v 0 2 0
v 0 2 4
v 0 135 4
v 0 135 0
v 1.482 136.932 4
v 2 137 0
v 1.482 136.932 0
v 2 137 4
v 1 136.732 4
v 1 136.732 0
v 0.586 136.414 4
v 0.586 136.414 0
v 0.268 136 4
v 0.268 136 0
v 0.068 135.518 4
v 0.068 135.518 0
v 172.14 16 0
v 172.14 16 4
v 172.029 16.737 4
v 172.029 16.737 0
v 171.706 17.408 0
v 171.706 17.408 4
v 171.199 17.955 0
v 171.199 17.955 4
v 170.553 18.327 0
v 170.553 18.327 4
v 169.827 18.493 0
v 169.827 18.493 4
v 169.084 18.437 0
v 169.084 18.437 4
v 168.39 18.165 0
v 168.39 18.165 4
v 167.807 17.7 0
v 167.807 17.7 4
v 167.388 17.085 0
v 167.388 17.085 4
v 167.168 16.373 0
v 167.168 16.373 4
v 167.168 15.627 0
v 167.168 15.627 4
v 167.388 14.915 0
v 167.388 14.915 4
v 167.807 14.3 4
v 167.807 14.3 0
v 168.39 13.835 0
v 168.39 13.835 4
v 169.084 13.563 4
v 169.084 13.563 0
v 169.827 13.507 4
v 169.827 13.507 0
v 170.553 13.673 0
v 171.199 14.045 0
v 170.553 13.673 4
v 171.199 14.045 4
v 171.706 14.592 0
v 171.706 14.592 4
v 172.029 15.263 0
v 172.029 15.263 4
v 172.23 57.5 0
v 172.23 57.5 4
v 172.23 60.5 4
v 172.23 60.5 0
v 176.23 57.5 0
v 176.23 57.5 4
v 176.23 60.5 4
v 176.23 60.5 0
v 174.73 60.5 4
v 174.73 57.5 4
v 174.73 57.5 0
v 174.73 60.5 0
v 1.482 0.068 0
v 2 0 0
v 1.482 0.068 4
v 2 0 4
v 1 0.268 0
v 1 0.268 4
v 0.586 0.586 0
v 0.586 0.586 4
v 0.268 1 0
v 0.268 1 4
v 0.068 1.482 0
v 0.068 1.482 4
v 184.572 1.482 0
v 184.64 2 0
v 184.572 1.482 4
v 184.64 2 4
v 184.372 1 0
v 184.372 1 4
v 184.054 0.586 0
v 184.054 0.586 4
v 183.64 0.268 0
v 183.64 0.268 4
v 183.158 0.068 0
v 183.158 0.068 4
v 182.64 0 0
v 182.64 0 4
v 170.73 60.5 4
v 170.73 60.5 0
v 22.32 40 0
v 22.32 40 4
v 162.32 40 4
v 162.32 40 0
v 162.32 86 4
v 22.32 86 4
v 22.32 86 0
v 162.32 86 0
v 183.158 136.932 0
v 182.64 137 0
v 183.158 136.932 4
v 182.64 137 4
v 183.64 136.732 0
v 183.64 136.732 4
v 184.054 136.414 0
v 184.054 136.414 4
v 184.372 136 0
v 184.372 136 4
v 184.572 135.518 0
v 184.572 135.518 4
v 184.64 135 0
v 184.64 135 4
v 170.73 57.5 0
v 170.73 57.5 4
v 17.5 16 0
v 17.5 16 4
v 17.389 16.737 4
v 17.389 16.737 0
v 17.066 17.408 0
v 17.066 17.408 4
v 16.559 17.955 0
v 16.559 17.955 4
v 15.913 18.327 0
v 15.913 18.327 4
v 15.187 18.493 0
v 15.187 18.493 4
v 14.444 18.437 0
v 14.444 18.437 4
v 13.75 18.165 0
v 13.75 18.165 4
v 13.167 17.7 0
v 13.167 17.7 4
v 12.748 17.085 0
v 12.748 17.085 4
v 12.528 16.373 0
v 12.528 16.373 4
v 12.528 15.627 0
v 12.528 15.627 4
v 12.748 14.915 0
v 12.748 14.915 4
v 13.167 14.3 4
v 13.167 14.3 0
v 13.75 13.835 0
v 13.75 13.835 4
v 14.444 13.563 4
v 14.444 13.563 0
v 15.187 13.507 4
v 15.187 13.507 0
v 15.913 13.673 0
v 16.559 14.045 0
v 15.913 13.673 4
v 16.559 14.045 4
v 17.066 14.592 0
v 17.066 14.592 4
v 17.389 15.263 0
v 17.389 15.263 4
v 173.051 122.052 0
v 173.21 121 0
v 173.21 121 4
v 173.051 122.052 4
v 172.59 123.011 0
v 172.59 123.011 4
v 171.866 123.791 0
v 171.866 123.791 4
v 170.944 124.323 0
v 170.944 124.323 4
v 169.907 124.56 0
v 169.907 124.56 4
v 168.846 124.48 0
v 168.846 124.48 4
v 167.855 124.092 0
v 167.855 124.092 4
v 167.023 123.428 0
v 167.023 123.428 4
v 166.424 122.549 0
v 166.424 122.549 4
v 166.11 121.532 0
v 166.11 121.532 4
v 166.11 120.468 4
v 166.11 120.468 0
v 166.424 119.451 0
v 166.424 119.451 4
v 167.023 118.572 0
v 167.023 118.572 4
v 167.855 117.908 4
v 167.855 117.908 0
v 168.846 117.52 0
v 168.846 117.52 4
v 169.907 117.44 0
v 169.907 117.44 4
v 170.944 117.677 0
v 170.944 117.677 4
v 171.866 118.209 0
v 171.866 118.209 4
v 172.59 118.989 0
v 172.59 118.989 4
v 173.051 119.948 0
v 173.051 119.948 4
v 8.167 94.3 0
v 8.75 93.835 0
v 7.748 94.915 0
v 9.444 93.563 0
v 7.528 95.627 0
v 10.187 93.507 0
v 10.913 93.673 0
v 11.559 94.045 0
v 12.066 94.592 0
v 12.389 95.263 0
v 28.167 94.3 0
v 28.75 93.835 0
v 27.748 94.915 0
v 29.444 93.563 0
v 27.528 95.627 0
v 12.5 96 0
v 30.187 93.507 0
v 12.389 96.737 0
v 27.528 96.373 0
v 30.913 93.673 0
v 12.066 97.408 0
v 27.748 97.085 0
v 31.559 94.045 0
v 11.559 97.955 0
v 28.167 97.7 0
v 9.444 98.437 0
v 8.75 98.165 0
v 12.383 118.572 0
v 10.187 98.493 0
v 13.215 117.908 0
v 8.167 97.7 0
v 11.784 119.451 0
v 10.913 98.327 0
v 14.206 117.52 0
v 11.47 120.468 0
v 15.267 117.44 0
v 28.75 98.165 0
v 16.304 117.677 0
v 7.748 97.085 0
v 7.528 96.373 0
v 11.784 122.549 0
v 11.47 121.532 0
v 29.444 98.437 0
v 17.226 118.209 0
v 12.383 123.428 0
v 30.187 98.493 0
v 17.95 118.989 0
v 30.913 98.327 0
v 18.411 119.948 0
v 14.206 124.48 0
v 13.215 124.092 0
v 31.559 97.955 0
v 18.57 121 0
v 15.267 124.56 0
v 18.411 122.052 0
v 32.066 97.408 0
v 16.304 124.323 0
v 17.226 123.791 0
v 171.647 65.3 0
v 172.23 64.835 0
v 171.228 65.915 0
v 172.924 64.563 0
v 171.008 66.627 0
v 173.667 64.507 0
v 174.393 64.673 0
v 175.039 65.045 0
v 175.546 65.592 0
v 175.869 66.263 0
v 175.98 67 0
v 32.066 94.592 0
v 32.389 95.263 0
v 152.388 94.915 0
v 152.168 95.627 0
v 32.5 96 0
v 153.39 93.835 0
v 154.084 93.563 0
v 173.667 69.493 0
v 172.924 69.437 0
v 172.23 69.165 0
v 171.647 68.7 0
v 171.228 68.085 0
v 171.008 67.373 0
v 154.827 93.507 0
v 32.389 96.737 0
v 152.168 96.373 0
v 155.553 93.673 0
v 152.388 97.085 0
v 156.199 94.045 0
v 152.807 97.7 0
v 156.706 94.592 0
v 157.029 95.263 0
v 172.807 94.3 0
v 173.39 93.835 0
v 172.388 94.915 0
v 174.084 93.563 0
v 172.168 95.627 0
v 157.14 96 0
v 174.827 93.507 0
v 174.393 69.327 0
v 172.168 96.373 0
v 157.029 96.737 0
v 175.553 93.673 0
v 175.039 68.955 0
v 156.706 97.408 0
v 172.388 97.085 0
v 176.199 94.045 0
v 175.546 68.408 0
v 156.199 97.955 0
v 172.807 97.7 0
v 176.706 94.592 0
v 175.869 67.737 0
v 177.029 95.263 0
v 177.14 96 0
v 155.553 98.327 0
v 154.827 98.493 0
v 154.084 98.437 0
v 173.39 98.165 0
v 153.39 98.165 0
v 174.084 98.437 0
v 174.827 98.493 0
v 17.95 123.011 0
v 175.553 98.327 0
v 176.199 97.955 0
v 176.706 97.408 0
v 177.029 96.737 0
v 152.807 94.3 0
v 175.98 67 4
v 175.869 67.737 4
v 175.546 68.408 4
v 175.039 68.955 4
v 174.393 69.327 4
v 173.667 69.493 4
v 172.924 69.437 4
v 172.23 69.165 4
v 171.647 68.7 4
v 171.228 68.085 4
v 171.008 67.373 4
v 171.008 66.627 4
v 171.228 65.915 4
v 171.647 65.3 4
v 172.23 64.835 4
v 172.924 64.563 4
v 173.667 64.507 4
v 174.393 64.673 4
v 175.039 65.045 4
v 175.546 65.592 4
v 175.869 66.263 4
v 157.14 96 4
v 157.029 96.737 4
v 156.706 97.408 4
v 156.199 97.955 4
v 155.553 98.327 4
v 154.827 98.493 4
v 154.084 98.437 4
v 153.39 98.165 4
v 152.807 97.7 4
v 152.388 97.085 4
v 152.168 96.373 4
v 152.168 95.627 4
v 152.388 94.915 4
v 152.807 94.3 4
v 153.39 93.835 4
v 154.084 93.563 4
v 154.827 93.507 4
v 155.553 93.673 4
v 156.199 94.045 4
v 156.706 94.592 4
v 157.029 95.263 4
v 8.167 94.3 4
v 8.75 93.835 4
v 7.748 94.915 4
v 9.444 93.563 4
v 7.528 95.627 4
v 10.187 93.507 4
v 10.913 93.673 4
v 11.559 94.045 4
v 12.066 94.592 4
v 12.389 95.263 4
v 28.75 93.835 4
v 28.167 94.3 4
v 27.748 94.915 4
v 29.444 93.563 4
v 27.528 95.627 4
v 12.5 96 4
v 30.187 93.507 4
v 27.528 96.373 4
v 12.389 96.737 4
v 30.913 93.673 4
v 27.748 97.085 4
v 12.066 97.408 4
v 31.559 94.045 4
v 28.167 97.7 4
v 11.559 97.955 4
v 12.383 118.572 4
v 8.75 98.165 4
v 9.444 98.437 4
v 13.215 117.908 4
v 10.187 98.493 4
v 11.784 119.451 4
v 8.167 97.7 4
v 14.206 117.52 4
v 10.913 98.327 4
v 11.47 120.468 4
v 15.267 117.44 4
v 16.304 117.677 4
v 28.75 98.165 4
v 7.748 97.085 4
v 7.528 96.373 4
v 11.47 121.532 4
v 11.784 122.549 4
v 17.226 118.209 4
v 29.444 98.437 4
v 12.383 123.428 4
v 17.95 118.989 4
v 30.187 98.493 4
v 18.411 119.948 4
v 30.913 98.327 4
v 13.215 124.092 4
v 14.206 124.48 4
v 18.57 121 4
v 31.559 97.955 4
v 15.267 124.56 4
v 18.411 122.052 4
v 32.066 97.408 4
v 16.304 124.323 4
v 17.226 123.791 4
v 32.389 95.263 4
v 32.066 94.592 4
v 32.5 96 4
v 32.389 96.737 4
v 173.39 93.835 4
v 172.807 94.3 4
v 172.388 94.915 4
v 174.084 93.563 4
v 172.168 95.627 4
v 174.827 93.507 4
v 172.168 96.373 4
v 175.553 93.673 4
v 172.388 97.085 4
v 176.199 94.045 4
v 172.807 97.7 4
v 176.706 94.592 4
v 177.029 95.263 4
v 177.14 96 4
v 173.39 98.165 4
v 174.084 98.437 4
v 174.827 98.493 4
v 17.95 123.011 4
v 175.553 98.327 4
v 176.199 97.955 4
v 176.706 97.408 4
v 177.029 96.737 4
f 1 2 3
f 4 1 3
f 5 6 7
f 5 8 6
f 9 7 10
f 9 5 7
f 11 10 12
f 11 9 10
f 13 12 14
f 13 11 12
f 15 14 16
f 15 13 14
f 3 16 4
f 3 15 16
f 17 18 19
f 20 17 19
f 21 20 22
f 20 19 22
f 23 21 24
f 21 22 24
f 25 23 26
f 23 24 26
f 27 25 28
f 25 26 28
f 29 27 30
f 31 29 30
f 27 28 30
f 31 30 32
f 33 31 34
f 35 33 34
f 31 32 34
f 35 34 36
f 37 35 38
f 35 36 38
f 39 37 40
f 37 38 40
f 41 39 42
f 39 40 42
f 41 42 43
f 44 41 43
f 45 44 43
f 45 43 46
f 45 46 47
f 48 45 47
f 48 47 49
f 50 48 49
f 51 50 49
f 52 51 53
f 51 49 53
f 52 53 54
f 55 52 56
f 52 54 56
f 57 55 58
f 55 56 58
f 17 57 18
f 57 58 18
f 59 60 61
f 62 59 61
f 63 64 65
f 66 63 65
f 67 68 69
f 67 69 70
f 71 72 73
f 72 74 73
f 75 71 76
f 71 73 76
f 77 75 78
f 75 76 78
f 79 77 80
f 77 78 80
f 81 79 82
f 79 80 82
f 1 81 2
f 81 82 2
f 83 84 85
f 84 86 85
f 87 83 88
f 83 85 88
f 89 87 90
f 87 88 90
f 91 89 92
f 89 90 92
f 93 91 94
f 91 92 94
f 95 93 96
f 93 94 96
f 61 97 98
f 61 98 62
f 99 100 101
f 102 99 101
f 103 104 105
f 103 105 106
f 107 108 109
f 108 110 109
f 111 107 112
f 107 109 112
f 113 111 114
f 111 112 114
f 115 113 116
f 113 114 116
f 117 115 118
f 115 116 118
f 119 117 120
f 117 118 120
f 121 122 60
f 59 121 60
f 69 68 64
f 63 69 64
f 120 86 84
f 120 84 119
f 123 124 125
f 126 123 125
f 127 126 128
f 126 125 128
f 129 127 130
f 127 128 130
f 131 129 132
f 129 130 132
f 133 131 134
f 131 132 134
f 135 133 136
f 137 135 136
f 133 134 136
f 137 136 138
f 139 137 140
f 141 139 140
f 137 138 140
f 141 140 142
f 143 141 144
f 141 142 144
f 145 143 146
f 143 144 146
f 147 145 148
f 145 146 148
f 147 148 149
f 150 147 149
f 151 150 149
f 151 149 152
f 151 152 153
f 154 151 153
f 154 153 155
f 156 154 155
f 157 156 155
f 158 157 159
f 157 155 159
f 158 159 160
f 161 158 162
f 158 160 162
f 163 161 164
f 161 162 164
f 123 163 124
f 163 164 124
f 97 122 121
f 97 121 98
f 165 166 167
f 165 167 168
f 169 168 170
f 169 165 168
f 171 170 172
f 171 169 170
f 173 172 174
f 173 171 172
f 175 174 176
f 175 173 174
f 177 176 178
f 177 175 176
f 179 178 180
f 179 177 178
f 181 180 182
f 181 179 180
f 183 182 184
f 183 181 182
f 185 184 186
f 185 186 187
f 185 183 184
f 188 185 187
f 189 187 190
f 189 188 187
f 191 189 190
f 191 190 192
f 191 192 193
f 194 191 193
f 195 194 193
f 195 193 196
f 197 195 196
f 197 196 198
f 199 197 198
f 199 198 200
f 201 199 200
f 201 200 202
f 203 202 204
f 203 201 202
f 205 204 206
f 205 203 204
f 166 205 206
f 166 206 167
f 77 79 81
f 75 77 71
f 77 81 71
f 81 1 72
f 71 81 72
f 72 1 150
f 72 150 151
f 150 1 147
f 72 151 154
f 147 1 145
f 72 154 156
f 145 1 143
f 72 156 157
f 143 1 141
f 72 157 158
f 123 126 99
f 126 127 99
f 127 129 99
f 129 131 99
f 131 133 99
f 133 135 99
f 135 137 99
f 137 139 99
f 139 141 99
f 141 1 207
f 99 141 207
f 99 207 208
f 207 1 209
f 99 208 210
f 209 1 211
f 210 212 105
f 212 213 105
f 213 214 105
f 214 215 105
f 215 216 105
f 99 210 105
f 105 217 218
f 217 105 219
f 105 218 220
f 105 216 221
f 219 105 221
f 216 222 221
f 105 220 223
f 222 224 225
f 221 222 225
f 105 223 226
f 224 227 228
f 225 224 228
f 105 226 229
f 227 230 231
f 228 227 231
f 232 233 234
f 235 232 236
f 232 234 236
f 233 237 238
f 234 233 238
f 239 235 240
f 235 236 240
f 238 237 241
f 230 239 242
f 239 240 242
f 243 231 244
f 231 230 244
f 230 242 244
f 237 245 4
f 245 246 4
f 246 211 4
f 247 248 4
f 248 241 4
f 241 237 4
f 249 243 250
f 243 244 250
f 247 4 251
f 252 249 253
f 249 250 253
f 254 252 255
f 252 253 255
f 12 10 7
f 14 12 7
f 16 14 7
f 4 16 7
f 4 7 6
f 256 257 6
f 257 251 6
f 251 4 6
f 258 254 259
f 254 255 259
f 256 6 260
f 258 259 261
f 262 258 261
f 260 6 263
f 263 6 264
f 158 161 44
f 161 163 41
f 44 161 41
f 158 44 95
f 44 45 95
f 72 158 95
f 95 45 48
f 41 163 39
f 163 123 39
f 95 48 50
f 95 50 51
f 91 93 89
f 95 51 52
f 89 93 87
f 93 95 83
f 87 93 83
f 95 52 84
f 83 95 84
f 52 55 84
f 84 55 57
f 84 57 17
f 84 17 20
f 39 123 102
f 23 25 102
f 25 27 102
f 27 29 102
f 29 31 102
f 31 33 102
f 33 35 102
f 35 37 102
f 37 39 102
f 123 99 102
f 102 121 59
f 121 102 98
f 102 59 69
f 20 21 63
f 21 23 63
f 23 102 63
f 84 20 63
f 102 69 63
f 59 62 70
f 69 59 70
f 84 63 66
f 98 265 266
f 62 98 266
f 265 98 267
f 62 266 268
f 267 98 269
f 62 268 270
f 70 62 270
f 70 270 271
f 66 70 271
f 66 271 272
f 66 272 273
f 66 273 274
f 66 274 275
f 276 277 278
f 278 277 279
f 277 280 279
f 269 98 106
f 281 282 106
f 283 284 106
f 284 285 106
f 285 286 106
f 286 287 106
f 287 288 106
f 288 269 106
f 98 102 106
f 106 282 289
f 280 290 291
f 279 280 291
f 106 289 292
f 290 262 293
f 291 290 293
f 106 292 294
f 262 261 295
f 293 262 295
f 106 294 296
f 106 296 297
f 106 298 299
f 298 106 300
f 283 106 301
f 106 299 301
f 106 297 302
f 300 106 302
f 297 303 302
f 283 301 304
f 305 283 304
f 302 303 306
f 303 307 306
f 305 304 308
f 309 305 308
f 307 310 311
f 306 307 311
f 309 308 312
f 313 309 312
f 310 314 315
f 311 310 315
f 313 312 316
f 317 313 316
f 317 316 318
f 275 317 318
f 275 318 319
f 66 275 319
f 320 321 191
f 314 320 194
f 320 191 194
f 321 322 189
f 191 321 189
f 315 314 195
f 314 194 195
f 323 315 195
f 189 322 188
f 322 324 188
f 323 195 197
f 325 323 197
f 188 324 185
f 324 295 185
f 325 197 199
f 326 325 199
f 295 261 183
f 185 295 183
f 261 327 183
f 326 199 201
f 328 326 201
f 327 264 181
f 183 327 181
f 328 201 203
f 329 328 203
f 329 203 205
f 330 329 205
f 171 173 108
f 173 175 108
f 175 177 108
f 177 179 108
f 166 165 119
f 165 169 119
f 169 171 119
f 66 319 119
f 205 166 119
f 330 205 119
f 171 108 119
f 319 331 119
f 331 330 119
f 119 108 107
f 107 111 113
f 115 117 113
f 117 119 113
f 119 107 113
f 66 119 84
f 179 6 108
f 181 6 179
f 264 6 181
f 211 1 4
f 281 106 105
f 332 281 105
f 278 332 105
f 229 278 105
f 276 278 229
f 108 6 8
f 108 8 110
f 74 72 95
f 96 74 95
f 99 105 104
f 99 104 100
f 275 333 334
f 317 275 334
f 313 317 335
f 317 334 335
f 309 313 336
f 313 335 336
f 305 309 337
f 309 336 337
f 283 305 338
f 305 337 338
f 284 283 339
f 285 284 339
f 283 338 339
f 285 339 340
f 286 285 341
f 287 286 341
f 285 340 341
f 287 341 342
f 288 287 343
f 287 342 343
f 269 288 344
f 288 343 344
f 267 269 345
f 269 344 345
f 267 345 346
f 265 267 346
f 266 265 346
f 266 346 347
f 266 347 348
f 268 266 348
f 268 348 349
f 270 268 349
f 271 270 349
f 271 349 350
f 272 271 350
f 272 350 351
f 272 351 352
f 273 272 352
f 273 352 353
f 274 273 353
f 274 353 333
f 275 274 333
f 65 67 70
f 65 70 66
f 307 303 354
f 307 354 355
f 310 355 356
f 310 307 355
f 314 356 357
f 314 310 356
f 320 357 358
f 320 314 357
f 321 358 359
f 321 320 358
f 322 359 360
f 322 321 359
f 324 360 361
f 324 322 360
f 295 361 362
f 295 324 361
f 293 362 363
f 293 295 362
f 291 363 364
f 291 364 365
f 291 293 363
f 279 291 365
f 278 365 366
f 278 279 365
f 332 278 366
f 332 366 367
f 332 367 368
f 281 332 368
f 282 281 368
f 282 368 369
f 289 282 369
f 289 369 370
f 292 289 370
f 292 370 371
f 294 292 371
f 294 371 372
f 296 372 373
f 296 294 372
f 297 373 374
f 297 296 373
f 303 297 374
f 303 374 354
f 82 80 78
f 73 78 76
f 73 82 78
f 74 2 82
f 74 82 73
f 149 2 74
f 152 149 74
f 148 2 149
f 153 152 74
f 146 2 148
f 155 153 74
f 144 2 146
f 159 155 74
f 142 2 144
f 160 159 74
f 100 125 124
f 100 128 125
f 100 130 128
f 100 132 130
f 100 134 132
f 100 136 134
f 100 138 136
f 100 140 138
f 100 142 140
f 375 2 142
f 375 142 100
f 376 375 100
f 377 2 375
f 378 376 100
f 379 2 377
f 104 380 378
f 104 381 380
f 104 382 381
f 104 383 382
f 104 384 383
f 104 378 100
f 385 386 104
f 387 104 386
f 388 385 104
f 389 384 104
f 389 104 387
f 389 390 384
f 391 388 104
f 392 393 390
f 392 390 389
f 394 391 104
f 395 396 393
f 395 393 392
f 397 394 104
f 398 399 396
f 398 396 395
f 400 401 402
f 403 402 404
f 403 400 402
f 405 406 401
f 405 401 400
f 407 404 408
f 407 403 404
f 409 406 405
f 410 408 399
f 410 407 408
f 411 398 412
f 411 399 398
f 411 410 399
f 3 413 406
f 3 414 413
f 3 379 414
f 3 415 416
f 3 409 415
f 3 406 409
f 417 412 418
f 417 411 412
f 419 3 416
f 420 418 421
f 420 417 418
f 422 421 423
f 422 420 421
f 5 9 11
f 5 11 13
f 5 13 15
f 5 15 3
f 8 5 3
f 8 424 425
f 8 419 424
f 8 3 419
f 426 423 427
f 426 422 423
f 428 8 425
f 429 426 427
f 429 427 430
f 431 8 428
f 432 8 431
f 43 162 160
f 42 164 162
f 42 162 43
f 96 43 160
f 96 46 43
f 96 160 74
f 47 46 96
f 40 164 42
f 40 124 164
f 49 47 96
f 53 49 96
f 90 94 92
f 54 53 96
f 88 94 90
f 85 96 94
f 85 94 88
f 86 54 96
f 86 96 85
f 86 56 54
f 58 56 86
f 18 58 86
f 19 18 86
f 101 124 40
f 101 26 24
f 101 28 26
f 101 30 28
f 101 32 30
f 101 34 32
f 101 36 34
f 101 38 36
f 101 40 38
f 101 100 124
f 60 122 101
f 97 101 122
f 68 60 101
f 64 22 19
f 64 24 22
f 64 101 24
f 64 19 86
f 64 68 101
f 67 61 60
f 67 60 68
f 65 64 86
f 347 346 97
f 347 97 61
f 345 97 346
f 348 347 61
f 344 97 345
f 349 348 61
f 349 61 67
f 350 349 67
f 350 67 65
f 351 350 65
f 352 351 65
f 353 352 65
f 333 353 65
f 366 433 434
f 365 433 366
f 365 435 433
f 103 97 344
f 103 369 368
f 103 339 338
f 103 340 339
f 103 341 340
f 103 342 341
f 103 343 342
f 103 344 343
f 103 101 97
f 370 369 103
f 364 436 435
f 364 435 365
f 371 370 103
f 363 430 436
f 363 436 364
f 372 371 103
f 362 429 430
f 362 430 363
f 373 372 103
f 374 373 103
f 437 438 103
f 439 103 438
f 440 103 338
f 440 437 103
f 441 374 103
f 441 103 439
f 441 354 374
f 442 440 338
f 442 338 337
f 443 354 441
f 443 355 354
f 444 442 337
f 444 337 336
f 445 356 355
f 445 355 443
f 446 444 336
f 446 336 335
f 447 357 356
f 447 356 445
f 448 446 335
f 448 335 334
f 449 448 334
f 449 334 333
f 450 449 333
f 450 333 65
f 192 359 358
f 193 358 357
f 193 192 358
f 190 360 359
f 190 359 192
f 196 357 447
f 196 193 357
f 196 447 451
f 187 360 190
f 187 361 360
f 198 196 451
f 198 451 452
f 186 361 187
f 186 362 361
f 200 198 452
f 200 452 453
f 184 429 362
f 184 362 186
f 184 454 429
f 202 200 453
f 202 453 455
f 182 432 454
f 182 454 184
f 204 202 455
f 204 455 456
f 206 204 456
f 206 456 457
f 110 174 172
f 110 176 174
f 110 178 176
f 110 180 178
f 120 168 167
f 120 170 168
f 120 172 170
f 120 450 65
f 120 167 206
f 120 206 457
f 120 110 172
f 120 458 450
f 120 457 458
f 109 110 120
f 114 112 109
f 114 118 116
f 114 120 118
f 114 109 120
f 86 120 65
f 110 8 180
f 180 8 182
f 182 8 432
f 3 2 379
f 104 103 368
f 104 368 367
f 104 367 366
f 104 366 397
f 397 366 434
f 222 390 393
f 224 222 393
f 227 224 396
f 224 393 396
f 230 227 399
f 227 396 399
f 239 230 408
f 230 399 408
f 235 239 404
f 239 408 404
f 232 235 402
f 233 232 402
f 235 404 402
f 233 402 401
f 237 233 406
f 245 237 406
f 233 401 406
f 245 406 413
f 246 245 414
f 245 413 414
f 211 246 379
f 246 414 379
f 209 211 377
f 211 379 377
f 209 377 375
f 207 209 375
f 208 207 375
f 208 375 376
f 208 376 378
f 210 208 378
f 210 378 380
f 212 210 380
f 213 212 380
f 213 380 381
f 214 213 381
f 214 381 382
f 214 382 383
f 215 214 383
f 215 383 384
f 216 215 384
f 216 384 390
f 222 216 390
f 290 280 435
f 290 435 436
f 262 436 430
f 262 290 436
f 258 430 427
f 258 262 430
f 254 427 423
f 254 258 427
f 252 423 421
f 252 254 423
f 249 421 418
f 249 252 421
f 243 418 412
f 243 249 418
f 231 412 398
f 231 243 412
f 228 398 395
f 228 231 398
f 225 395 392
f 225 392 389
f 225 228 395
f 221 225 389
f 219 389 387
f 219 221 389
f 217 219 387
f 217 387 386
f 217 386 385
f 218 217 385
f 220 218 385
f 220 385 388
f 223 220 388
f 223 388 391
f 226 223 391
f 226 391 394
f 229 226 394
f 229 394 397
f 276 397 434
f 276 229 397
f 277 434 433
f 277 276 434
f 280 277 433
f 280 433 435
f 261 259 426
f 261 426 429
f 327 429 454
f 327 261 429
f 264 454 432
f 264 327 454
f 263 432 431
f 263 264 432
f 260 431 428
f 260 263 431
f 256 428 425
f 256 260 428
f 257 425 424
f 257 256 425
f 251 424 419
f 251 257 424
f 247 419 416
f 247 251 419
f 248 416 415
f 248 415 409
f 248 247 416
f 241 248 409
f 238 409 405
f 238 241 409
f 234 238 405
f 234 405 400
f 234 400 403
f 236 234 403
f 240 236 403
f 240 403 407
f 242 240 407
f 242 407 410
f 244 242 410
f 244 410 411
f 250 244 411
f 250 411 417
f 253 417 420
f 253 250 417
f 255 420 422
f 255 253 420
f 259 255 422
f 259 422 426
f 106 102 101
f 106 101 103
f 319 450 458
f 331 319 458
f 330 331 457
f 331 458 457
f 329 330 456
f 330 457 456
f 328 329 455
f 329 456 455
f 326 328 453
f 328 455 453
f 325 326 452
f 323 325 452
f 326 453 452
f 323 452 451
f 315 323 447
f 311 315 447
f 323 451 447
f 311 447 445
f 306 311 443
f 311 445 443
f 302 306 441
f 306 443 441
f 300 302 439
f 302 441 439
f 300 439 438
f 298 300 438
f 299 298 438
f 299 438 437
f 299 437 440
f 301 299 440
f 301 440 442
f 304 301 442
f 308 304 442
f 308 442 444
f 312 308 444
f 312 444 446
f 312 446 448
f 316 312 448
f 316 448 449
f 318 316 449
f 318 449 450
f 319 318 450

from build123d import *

# Parameters (mm, degrees)
SKETCH1_W           = 184.64
SKETCH1_H           = 137
SKETCH1_R           = 3.65
SKETCH1_R_2         = 3.57
SKETCH1_R_3         = 2.5
BOSS_EXTRUDE1_DEPTH = 4
SKETCH3_W           = 104.64
SKETCH3_H           = 20
BOSS_EXTRUDE2_DEPTH = 4
SKETCH6_R           = 3.65
CUT_EXTRUDE4_DEPTH  = 5
SKETCH8_W           = 140
SKETCH8_H           = 16
CUT_EXTRUDE6_DEPTH  = 10
FILLET5_R           = 2
SKETCH11_W          = 184.64
SKETCH11_H          = 15
SKETCH11_R          = 2.5
BOSS_EXTRUDE4_DEPTH = 4
SKETCH12_R          = 2.5
CUT_EXTRUDE8_DEPTH  = 5
SKETCH13_R          = 2.5
CUT_EXTRUDE9_DEPTH  = 10
SKETCH14_W          = 1.5
SKETCH14_H          = 3
CUT_EXTRUDE10_DEPTH = 5


with BuildPart() as part:
    # Sketch1 → Boss-Extrude1 (new body)
    with BuildSketch(Plane.XY):
        with Locations((92.32, 68.5)):
            Rectangle(SKETCH1_W, SKETCH1_H)
        with Locations((15, 16)):
            Circle(SKETCH1_R, mode=Mode.SUBTRACT)
        with Locations((169.64, 16)):
            Circle(SKETCH1_R, mode=Mode.SUBTRACT)
        with Locations((15, 121)):
            Circle(SKETCH1_R_2, mode=Mode.SUBTRACT)
        with Locations((30, 96)):
            Circle(SKETCH1_R_3, mode=Mode.SUBTRACT)
        with Locations((169.64, 121)):
            Circle(SKETCH1_R_2, mode=Mode.SUBTRACT)
        with Locations((154.64, 96)):
            Circle(SKETCH1_R_3, mode=Mode.SUBTRACT)
        Polygon((40, 106), (40, 86), (22.32, 86), (22.32, 56), (162.32, 56), (162.32, 86), (144.64, 86), (144.64, 106), align=None, mode=Mode.SUBTRACT)
    extrude(amount=BOSS_EXTRUDE1_DEPTH)

    # Sketch3 → Boss-Extrude2 (add)
    with BuildSketch(Plane.XY.offset(4)):
        with Locations((92.32, 96)):
            Rectangle(SKETCH3_W, SKETCH3_H)
    extrude(amount=-BOSS_EXTRUDE2_DEPTH)

    # Sketch6 → Cut-Extrude4 (cut, through all)
    with BuildSketch(Plane.XY.offset(4)):
        with Locations((67.32, 16)):
            Circle(SKETCH6_R)
        with Locations((117.32, 16)):
            Circle(SKETCH6_R)
    extrude(amount=-CUT_EXTRUDE4_DEPTH, mode=Mode.SUBTRACT)

    # Sketch8 → Cut-Extrude6 (cut)
    with BuildSketch(Plane.XY.offset(4)):
        with Locations((92.32, 48)):
            Rectangle(SKETCH8_W, SKETCH8_H)
    extrude(amount=-CUT_EXTRUDE6_DEPTH, mode=Mode.SUBTRACT)

    # Fillet5
    fillet5_edges = [part.edges().sort_by_distance(p)[0] for p in [
        (0, 137, 2),
        (184.64, 137, 2),
        (184.64, 0, 2),
        (0, 0, 2),
    ]]
    fillet(fillet5_edges, radius=FILLET5_R)

    # Sketch11 → Boss-Extrude4 (add, through all)
    with BuildSketch(Plane.XY.offset(4)):
        with Locations((92.32, 16)):
            Rectangle(SKETCH11_W, SKETCH11_H)
        with Locations((15, 16)):
            Circle(SKETCH11_R, mode=Mode.SUBTRACT)
        with Locations((169.64, 16)):
            Circle(SKETCH11_R, mode=Mode.SUBTRACT)
    extrude(amount=-BOSS_EXTRUDE4_DEPTH)

    # Sketch12 → Cut-Extrude8 (cut, through all)
    with BuildSketch(Plane.XY.offset(4)):
        with Locations((10, 96)):
            Circle(SKETCH12_R)
        with Locations((174.64, 96)):
            Circle(SKETCH12_R)
    extrude(amount=-CUT_EXTRUDE8_DEPTH, mode=Mode.SUBTRACT)

    # Sketch13 → Cut-Extrude9 (cut)
    with BuildSketch(Plane.XY.offset(4)):
        with Locations((173.48, 67)):
            Circle(SKETCH13_R)
    extrude(amount=-CUT_EXTRUDE9_DEPTH, mode=Mode.SUBTRACT)

    # Sketch14 → Cut-Extrude10 (cut, through all)
    with BuildSketch(Plane.XY.offset(4)):
        with Locations((171.48, 59)):
            Rectangle(SKETCH14_W, SKETCH14_H)
        with Locations((175.48, 59)):
            Rectangle(SKETCH14_W, SKETCH14_H)
    extrude(amount=-CUT_EXTRUDE10_DEPTH, mode=Mode.SUBTRACT)


solid = part.part
